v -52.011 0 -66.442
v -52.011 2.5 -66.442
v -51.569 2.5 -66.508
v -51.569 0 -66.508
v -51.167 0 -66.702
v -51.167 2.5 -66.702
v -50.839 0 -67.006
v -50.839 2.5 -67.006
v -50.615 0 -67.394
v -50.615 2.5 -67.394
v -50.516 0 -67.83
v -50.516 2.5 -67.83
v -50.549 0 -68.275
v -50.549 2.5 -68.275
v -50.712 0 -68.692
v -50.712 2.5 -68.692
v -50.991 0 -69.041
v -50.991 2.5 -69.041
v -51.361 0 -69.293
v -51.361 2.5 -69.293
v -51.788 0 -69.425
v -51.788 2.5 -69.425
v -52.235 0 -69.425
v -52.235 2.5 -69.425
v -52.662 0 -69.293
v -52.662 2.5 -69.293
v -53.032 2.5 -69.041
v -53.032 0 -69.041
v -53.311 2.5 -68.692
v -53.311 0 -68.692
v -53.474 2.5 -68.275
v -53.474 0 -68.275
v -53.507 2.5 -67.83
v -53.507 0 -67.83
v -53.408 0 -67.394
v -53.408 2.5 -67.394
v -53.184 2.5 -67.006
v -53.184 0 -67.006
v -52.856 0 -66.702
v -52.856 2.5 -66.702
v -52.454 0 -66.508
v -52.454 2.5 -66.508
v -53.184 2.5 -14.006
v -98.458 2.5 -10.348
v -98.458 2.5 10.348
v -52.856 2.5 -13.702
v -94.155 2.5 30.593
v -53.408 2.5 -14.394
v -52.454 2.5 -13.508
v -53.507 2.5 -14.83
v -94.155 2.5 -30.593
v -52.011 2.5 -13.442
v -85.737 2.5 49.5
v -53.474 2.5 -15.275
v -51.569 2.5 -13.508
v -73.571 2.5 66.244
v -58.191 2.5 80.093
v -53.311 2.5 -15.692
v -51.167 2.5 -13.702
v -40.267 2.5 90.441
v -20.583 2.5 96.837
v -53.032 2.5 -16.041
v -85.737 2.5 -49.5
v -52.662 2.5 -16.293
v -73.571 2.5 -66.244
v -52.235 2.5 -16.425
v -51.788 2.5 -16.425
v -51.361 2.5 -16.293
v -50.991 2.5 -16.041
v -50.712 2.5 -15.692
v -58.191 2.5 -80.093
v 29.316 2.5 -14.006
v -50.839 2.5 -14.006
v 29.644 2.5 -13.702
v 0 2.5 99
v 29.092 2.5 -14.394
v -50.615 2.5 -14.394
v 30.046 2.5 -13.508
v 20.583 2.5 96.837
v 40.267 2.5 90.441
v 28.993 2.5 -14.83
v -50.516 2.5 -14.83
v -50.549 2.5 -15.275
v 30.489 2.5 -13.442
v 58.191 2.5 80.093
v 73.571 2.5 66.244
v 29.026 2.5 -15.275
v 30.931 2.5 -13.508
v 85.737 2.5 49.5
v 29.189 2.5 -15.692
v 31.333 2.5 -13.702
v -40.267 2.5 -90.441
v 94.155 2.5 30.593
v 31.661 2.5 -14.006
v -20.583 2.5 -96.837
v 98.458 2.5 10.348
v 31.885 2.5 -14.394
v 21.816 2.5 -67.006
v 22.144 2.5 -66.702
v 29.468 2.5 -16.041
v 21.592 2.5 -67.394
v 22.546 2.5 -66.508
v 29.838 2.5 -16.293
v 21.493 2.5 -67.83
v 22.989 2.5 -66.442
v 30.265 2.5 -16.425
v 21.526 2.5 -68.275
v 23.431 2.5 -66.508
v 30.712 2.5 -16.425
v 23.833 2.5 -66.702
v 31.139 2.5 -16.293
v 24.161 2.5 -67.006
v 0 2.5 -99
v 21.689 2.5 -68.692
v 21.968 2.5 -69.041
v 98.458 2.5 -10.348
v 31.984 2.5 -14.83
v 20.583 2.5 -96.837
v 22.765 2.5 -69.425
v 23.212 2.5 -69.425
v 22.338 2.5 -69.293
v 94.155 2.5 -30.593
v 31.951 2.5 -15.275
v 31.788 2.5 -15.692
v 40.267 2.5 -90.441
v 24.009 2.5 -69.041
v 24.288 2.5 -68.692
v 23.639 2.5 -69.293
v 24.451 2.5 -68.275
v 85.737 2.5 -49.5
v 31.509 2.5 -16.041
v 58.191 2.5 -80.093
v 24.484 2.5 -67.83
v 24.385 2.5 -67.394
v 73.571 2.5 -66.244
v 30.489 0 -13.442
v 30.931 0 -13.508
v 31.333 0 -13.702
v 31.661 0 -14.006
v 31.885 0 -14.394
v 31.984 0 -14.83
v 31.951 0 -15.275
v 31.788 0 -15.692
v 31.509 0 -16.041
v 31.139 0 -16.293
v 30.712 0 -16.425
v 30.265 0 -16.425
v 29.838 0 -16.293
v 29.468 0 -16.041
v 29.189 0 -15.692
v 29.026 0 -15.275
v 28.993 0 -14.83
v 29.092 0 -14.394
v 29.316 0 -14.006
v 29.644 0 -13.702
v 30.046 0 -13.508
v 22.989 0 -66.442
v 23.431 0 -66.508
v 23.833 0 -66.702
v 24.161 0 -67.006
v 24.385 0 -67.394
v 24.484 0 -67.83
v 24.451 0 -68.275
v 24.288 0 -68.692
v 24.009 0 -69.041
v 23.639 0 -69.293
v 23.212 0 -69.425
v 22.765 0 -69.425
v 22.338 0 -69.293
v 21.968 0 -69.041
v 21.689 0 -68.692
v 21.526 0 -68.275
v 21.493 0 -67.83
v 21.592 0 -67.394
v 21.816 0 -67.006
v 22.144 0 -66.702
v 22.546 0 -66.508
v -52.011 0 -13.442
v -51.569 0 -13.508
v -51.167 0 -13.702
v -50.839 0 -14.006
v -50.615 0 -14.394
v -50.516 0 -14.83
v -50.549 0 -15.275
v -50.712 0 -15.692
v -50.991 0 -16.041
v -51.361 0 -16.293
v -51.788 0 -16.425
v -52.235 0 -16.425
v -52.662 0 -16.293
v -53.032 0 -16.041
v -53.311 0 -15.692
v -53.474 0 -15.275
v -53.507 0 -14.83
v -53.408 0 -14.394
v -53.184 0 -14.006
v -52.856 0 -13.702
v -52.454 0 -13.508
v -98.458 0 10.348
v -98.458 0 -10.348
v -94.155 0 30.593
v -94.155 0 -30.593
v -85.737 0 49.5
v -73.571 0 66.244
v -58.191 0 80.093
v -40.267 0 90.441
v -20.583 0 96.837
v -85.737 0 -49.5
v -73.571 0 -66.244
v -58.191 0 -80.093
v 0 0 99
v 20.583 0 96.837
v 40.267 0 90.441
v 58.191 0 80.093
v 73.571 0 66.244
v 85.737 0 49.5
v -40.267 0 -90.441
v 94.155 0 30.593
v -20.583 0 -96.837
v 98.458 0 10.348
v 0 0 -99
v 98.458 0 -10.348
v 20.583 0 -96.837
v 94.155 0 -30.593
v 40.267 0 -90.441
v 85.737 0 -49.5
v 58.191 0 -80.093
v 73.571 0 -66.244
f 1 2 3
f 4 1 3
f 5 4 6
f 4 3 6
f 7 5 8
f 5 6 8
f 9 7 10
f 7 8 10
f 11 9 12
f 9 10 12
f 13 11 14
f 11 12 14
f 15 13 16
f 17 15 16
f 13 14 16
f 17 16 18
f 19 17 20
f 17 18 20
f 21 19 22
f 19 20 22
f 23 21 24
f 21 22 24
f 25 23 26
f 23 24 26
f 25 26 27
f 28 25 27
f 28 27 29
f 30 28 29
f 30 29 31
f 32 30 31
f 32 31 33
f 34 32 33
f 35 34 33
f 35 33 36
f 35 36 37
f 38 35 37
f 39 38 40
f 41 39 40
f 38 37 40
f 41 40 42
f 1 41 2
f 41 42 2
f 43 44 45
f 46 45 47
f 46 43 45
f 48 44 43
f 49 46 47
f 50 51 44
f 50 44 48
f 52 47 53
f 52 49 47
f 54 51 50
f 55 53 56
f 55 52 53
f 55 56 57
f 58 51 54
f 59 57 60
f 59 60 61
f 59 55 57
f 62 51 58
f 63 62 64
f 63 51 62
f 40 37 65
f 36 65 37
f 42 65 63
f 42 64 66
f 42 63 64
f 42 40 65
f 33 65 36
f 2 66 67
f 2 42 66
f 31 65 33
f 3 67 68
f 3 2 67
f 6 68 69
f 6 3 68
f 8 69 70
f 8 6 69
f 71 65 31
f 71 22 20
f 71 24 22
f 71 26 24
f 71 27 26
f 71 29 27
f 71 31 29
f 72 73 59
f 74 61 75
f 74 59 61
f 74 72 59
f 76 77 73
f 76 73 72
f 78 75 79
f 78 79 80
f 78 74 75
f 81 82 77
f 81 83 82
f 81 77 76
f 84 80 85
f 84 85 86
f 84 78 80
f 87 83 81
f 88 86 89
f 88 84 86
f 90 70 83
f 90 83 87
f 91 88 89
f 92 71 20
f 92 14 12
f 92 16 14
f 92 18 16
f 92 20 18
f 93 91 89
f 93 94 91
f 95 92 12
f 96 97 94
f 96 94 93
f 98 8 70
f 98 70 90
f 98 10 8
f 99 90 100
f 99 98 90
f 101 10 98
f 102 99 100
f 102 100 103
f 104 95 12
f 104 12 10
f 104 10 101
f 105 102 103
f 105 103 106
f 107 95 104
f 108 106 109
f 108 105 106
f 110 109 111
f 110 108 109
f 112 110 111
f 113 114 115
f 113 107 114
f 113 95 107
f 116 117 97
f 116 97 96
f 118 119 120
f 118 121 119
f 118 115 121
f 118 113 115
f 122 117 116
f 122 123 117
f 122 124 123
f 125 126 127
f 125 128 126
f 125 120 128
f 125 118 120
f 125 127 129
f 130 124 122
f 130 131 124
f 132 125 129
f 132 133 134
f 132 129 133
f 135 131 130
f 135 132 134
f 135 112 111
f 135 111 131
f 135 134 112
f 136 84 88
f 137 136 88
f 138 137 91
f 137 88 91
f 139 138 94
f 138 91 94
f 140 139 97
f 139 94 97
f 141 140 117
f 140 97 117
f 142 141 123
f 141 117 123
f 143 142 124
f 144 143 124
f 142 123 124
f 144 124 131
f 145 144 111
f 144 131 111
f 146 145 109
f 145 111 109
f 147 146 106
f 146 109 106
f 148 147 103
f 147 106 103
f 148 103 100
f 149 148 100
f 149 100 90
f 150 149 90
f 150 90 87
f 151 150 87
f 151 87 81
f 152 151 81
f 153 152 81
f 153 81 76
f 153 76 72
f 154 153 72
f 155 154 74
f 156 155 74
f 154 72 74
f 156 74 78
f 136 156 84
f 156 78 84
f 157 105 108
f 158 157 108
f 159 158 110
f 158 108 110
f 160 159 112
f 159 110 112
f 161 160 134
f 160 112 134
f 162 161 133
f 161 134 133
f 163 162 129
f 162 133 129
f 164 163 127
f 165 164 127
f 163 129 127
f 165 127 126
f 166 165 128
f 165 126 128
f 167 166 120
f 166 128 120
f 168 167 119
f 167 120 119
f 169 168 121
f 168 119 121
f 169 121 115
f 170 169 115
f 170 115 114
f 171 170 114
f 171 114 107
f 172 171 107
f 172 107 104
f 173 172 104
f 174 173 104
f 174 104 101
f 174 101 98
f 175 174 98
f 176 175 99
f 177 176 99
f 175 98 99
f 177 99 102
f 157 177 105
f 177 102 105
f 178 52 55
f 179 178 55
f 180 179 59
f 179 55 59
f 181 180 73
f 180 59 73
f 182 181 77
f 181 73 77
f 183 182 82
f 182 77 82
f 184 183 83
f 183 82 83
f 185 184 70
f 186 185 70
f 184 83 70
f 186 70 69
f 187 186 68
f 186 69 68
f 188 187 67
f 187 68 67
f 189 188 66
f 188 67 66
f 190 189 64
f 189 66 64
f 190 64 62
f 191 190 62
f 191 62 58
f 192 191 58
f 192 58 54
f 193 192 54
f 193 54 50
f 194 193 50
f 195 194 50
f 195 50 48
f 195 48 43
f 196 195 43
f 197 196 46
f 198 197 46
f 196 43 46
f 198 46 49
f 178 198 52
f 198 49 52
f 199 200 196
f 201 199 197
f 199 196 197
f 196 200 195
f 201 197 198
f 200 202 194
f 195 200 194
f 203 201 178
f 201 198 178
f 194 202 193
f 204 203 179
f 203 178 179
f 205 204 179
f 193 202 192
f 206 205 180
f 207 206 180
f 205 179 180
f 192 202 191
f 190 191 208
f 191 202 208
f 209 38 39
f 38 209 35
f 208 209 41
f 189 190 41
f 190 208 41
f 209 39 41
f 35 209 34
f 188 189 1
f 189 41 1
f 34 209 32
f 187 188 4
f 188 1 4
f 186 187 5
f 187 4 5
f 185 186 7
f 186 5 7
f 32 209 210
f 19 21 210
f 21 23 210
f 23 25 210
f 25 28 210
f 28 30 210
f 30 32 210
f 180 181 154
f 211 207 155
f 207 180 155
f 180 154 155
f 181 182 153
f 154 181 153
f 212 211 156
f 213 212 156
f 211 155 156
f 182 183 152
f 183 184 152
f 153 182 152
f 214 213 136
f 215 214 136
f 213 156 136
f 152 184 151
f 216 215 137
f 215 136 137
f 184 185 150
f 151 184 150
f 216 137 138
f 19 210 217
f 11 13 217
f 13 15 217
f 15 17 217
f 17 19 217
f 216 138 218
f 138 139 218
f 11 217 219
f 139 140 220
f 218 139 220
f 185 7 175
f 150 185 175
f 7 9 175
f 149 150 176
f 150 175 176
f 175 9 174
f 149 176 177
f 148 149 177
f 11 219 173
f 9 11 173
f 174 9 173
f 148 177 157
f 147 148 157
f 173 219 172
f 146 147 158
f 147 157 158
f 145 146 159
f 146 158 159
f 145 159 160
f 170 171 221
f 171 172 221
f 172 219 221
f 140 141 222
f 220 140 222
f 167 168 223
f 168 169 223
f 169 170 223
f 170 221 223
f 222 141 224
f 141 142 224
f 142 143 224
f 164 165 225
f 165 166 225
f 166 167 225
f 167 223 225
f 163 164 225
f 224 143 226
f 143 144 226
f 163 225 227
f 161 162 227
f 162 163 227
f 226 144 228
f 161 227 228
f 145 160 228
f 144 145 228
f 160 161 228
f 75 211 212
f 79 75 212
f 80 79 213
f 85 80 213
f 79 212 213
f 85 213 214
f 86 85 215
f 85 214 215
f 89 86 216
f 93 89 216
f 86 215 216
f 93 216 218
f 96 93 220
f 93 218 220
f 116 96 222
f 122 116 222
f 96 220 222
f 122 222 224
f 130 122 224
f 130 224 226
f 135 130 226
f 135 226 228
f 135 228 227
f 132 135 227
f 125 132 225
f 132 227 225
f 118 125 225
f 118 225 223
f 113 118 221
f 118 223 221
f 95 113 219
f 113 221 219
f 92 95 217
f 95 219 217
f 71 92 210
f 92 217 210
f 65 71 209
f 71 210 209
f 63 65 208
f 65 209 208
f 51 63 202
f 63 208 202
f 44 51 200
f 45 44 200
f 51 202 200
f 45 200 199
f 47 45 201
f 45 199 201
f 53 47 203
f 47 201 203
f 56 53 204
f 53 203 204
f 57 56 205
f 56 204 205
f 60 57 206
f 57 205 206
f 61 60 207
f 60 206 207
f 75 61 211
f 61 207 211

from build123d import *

# Parameters (mm, degrees)
SKETCH1_R           = 99
BOSS_EXTRUDE1_DEPTH = 2.5
SKETCH2_R           = 96.5
CUT_EXTRUDE1_DEPTH  = 2.5
SKETCH3_R           = 96.5
SKETCH3_R_2         = 1.5
BOSS_EXTRUDE3_DEPTH = 2.5


with BuildPart() as part:
    # Sketch1 → Boss-Extrude1 (new body)
    with BuildSketch(Plane(origin=(0, 0, 0), x_dir=(1, 0, 0), z_dir=(0, 1, 0))):
        with Locations(Location((0, 0, 0), (0, 0, 270))):
            Circle(SKETCH1_R)
    extrude(amount=BOSS_EXTRUDE1_DEPTH)

    # Sketch2 → Cut-Extrude1 (cut)
    with BuildSketch(Plane(origin=(0, 2.5, 0), x_dir=(1, 0, 0), z_dir=(0, 1, 0))):
        with Locations(Location((0, 0, 0), (0, 0, 270))):
            Circle(SKETCH2_R)
    extrude(amount=-CUT_EXTRUDE1_DEPTH, mode=Mode.SUBTRACT)

    # Sketch3 → Boss-Extrude3 (add)
    with BuildSketch(Plane(origin=(0, 2.5, 0), x_dir=(1, 0, 0), z_dir=(0, 1, 0))):
        Circle(SKETCH3_R)
        with Locations(Location((-52.01148814, 14.941708329, 0), (0, 0, 270))):
            Circle(SKETCH3_R_2, mode=Mode.SUBTRACT)
        with Locations(Location((-52.01148814, 67.941708329, 0), (0, 0, 270))):
            Circle(SKETCH3_R_2, mode=Mode.SUBTRACT)
        with Locations(Location((22.98851186, 67.941708329, 0), (0, 0, 270))):
            Circle(SKETCH3_R_2, mode=Mode.SUBTRACT)
        with Locations(Location((30.48851186, 14.941708329, 0), (0, 0, 270))):
            Circle(SKETCH3_R_2, mode=Mode.SUBTRACT)
    extrude(amount=-BOSS_EXTRUDE3_DEPTH)


solid = part.part
